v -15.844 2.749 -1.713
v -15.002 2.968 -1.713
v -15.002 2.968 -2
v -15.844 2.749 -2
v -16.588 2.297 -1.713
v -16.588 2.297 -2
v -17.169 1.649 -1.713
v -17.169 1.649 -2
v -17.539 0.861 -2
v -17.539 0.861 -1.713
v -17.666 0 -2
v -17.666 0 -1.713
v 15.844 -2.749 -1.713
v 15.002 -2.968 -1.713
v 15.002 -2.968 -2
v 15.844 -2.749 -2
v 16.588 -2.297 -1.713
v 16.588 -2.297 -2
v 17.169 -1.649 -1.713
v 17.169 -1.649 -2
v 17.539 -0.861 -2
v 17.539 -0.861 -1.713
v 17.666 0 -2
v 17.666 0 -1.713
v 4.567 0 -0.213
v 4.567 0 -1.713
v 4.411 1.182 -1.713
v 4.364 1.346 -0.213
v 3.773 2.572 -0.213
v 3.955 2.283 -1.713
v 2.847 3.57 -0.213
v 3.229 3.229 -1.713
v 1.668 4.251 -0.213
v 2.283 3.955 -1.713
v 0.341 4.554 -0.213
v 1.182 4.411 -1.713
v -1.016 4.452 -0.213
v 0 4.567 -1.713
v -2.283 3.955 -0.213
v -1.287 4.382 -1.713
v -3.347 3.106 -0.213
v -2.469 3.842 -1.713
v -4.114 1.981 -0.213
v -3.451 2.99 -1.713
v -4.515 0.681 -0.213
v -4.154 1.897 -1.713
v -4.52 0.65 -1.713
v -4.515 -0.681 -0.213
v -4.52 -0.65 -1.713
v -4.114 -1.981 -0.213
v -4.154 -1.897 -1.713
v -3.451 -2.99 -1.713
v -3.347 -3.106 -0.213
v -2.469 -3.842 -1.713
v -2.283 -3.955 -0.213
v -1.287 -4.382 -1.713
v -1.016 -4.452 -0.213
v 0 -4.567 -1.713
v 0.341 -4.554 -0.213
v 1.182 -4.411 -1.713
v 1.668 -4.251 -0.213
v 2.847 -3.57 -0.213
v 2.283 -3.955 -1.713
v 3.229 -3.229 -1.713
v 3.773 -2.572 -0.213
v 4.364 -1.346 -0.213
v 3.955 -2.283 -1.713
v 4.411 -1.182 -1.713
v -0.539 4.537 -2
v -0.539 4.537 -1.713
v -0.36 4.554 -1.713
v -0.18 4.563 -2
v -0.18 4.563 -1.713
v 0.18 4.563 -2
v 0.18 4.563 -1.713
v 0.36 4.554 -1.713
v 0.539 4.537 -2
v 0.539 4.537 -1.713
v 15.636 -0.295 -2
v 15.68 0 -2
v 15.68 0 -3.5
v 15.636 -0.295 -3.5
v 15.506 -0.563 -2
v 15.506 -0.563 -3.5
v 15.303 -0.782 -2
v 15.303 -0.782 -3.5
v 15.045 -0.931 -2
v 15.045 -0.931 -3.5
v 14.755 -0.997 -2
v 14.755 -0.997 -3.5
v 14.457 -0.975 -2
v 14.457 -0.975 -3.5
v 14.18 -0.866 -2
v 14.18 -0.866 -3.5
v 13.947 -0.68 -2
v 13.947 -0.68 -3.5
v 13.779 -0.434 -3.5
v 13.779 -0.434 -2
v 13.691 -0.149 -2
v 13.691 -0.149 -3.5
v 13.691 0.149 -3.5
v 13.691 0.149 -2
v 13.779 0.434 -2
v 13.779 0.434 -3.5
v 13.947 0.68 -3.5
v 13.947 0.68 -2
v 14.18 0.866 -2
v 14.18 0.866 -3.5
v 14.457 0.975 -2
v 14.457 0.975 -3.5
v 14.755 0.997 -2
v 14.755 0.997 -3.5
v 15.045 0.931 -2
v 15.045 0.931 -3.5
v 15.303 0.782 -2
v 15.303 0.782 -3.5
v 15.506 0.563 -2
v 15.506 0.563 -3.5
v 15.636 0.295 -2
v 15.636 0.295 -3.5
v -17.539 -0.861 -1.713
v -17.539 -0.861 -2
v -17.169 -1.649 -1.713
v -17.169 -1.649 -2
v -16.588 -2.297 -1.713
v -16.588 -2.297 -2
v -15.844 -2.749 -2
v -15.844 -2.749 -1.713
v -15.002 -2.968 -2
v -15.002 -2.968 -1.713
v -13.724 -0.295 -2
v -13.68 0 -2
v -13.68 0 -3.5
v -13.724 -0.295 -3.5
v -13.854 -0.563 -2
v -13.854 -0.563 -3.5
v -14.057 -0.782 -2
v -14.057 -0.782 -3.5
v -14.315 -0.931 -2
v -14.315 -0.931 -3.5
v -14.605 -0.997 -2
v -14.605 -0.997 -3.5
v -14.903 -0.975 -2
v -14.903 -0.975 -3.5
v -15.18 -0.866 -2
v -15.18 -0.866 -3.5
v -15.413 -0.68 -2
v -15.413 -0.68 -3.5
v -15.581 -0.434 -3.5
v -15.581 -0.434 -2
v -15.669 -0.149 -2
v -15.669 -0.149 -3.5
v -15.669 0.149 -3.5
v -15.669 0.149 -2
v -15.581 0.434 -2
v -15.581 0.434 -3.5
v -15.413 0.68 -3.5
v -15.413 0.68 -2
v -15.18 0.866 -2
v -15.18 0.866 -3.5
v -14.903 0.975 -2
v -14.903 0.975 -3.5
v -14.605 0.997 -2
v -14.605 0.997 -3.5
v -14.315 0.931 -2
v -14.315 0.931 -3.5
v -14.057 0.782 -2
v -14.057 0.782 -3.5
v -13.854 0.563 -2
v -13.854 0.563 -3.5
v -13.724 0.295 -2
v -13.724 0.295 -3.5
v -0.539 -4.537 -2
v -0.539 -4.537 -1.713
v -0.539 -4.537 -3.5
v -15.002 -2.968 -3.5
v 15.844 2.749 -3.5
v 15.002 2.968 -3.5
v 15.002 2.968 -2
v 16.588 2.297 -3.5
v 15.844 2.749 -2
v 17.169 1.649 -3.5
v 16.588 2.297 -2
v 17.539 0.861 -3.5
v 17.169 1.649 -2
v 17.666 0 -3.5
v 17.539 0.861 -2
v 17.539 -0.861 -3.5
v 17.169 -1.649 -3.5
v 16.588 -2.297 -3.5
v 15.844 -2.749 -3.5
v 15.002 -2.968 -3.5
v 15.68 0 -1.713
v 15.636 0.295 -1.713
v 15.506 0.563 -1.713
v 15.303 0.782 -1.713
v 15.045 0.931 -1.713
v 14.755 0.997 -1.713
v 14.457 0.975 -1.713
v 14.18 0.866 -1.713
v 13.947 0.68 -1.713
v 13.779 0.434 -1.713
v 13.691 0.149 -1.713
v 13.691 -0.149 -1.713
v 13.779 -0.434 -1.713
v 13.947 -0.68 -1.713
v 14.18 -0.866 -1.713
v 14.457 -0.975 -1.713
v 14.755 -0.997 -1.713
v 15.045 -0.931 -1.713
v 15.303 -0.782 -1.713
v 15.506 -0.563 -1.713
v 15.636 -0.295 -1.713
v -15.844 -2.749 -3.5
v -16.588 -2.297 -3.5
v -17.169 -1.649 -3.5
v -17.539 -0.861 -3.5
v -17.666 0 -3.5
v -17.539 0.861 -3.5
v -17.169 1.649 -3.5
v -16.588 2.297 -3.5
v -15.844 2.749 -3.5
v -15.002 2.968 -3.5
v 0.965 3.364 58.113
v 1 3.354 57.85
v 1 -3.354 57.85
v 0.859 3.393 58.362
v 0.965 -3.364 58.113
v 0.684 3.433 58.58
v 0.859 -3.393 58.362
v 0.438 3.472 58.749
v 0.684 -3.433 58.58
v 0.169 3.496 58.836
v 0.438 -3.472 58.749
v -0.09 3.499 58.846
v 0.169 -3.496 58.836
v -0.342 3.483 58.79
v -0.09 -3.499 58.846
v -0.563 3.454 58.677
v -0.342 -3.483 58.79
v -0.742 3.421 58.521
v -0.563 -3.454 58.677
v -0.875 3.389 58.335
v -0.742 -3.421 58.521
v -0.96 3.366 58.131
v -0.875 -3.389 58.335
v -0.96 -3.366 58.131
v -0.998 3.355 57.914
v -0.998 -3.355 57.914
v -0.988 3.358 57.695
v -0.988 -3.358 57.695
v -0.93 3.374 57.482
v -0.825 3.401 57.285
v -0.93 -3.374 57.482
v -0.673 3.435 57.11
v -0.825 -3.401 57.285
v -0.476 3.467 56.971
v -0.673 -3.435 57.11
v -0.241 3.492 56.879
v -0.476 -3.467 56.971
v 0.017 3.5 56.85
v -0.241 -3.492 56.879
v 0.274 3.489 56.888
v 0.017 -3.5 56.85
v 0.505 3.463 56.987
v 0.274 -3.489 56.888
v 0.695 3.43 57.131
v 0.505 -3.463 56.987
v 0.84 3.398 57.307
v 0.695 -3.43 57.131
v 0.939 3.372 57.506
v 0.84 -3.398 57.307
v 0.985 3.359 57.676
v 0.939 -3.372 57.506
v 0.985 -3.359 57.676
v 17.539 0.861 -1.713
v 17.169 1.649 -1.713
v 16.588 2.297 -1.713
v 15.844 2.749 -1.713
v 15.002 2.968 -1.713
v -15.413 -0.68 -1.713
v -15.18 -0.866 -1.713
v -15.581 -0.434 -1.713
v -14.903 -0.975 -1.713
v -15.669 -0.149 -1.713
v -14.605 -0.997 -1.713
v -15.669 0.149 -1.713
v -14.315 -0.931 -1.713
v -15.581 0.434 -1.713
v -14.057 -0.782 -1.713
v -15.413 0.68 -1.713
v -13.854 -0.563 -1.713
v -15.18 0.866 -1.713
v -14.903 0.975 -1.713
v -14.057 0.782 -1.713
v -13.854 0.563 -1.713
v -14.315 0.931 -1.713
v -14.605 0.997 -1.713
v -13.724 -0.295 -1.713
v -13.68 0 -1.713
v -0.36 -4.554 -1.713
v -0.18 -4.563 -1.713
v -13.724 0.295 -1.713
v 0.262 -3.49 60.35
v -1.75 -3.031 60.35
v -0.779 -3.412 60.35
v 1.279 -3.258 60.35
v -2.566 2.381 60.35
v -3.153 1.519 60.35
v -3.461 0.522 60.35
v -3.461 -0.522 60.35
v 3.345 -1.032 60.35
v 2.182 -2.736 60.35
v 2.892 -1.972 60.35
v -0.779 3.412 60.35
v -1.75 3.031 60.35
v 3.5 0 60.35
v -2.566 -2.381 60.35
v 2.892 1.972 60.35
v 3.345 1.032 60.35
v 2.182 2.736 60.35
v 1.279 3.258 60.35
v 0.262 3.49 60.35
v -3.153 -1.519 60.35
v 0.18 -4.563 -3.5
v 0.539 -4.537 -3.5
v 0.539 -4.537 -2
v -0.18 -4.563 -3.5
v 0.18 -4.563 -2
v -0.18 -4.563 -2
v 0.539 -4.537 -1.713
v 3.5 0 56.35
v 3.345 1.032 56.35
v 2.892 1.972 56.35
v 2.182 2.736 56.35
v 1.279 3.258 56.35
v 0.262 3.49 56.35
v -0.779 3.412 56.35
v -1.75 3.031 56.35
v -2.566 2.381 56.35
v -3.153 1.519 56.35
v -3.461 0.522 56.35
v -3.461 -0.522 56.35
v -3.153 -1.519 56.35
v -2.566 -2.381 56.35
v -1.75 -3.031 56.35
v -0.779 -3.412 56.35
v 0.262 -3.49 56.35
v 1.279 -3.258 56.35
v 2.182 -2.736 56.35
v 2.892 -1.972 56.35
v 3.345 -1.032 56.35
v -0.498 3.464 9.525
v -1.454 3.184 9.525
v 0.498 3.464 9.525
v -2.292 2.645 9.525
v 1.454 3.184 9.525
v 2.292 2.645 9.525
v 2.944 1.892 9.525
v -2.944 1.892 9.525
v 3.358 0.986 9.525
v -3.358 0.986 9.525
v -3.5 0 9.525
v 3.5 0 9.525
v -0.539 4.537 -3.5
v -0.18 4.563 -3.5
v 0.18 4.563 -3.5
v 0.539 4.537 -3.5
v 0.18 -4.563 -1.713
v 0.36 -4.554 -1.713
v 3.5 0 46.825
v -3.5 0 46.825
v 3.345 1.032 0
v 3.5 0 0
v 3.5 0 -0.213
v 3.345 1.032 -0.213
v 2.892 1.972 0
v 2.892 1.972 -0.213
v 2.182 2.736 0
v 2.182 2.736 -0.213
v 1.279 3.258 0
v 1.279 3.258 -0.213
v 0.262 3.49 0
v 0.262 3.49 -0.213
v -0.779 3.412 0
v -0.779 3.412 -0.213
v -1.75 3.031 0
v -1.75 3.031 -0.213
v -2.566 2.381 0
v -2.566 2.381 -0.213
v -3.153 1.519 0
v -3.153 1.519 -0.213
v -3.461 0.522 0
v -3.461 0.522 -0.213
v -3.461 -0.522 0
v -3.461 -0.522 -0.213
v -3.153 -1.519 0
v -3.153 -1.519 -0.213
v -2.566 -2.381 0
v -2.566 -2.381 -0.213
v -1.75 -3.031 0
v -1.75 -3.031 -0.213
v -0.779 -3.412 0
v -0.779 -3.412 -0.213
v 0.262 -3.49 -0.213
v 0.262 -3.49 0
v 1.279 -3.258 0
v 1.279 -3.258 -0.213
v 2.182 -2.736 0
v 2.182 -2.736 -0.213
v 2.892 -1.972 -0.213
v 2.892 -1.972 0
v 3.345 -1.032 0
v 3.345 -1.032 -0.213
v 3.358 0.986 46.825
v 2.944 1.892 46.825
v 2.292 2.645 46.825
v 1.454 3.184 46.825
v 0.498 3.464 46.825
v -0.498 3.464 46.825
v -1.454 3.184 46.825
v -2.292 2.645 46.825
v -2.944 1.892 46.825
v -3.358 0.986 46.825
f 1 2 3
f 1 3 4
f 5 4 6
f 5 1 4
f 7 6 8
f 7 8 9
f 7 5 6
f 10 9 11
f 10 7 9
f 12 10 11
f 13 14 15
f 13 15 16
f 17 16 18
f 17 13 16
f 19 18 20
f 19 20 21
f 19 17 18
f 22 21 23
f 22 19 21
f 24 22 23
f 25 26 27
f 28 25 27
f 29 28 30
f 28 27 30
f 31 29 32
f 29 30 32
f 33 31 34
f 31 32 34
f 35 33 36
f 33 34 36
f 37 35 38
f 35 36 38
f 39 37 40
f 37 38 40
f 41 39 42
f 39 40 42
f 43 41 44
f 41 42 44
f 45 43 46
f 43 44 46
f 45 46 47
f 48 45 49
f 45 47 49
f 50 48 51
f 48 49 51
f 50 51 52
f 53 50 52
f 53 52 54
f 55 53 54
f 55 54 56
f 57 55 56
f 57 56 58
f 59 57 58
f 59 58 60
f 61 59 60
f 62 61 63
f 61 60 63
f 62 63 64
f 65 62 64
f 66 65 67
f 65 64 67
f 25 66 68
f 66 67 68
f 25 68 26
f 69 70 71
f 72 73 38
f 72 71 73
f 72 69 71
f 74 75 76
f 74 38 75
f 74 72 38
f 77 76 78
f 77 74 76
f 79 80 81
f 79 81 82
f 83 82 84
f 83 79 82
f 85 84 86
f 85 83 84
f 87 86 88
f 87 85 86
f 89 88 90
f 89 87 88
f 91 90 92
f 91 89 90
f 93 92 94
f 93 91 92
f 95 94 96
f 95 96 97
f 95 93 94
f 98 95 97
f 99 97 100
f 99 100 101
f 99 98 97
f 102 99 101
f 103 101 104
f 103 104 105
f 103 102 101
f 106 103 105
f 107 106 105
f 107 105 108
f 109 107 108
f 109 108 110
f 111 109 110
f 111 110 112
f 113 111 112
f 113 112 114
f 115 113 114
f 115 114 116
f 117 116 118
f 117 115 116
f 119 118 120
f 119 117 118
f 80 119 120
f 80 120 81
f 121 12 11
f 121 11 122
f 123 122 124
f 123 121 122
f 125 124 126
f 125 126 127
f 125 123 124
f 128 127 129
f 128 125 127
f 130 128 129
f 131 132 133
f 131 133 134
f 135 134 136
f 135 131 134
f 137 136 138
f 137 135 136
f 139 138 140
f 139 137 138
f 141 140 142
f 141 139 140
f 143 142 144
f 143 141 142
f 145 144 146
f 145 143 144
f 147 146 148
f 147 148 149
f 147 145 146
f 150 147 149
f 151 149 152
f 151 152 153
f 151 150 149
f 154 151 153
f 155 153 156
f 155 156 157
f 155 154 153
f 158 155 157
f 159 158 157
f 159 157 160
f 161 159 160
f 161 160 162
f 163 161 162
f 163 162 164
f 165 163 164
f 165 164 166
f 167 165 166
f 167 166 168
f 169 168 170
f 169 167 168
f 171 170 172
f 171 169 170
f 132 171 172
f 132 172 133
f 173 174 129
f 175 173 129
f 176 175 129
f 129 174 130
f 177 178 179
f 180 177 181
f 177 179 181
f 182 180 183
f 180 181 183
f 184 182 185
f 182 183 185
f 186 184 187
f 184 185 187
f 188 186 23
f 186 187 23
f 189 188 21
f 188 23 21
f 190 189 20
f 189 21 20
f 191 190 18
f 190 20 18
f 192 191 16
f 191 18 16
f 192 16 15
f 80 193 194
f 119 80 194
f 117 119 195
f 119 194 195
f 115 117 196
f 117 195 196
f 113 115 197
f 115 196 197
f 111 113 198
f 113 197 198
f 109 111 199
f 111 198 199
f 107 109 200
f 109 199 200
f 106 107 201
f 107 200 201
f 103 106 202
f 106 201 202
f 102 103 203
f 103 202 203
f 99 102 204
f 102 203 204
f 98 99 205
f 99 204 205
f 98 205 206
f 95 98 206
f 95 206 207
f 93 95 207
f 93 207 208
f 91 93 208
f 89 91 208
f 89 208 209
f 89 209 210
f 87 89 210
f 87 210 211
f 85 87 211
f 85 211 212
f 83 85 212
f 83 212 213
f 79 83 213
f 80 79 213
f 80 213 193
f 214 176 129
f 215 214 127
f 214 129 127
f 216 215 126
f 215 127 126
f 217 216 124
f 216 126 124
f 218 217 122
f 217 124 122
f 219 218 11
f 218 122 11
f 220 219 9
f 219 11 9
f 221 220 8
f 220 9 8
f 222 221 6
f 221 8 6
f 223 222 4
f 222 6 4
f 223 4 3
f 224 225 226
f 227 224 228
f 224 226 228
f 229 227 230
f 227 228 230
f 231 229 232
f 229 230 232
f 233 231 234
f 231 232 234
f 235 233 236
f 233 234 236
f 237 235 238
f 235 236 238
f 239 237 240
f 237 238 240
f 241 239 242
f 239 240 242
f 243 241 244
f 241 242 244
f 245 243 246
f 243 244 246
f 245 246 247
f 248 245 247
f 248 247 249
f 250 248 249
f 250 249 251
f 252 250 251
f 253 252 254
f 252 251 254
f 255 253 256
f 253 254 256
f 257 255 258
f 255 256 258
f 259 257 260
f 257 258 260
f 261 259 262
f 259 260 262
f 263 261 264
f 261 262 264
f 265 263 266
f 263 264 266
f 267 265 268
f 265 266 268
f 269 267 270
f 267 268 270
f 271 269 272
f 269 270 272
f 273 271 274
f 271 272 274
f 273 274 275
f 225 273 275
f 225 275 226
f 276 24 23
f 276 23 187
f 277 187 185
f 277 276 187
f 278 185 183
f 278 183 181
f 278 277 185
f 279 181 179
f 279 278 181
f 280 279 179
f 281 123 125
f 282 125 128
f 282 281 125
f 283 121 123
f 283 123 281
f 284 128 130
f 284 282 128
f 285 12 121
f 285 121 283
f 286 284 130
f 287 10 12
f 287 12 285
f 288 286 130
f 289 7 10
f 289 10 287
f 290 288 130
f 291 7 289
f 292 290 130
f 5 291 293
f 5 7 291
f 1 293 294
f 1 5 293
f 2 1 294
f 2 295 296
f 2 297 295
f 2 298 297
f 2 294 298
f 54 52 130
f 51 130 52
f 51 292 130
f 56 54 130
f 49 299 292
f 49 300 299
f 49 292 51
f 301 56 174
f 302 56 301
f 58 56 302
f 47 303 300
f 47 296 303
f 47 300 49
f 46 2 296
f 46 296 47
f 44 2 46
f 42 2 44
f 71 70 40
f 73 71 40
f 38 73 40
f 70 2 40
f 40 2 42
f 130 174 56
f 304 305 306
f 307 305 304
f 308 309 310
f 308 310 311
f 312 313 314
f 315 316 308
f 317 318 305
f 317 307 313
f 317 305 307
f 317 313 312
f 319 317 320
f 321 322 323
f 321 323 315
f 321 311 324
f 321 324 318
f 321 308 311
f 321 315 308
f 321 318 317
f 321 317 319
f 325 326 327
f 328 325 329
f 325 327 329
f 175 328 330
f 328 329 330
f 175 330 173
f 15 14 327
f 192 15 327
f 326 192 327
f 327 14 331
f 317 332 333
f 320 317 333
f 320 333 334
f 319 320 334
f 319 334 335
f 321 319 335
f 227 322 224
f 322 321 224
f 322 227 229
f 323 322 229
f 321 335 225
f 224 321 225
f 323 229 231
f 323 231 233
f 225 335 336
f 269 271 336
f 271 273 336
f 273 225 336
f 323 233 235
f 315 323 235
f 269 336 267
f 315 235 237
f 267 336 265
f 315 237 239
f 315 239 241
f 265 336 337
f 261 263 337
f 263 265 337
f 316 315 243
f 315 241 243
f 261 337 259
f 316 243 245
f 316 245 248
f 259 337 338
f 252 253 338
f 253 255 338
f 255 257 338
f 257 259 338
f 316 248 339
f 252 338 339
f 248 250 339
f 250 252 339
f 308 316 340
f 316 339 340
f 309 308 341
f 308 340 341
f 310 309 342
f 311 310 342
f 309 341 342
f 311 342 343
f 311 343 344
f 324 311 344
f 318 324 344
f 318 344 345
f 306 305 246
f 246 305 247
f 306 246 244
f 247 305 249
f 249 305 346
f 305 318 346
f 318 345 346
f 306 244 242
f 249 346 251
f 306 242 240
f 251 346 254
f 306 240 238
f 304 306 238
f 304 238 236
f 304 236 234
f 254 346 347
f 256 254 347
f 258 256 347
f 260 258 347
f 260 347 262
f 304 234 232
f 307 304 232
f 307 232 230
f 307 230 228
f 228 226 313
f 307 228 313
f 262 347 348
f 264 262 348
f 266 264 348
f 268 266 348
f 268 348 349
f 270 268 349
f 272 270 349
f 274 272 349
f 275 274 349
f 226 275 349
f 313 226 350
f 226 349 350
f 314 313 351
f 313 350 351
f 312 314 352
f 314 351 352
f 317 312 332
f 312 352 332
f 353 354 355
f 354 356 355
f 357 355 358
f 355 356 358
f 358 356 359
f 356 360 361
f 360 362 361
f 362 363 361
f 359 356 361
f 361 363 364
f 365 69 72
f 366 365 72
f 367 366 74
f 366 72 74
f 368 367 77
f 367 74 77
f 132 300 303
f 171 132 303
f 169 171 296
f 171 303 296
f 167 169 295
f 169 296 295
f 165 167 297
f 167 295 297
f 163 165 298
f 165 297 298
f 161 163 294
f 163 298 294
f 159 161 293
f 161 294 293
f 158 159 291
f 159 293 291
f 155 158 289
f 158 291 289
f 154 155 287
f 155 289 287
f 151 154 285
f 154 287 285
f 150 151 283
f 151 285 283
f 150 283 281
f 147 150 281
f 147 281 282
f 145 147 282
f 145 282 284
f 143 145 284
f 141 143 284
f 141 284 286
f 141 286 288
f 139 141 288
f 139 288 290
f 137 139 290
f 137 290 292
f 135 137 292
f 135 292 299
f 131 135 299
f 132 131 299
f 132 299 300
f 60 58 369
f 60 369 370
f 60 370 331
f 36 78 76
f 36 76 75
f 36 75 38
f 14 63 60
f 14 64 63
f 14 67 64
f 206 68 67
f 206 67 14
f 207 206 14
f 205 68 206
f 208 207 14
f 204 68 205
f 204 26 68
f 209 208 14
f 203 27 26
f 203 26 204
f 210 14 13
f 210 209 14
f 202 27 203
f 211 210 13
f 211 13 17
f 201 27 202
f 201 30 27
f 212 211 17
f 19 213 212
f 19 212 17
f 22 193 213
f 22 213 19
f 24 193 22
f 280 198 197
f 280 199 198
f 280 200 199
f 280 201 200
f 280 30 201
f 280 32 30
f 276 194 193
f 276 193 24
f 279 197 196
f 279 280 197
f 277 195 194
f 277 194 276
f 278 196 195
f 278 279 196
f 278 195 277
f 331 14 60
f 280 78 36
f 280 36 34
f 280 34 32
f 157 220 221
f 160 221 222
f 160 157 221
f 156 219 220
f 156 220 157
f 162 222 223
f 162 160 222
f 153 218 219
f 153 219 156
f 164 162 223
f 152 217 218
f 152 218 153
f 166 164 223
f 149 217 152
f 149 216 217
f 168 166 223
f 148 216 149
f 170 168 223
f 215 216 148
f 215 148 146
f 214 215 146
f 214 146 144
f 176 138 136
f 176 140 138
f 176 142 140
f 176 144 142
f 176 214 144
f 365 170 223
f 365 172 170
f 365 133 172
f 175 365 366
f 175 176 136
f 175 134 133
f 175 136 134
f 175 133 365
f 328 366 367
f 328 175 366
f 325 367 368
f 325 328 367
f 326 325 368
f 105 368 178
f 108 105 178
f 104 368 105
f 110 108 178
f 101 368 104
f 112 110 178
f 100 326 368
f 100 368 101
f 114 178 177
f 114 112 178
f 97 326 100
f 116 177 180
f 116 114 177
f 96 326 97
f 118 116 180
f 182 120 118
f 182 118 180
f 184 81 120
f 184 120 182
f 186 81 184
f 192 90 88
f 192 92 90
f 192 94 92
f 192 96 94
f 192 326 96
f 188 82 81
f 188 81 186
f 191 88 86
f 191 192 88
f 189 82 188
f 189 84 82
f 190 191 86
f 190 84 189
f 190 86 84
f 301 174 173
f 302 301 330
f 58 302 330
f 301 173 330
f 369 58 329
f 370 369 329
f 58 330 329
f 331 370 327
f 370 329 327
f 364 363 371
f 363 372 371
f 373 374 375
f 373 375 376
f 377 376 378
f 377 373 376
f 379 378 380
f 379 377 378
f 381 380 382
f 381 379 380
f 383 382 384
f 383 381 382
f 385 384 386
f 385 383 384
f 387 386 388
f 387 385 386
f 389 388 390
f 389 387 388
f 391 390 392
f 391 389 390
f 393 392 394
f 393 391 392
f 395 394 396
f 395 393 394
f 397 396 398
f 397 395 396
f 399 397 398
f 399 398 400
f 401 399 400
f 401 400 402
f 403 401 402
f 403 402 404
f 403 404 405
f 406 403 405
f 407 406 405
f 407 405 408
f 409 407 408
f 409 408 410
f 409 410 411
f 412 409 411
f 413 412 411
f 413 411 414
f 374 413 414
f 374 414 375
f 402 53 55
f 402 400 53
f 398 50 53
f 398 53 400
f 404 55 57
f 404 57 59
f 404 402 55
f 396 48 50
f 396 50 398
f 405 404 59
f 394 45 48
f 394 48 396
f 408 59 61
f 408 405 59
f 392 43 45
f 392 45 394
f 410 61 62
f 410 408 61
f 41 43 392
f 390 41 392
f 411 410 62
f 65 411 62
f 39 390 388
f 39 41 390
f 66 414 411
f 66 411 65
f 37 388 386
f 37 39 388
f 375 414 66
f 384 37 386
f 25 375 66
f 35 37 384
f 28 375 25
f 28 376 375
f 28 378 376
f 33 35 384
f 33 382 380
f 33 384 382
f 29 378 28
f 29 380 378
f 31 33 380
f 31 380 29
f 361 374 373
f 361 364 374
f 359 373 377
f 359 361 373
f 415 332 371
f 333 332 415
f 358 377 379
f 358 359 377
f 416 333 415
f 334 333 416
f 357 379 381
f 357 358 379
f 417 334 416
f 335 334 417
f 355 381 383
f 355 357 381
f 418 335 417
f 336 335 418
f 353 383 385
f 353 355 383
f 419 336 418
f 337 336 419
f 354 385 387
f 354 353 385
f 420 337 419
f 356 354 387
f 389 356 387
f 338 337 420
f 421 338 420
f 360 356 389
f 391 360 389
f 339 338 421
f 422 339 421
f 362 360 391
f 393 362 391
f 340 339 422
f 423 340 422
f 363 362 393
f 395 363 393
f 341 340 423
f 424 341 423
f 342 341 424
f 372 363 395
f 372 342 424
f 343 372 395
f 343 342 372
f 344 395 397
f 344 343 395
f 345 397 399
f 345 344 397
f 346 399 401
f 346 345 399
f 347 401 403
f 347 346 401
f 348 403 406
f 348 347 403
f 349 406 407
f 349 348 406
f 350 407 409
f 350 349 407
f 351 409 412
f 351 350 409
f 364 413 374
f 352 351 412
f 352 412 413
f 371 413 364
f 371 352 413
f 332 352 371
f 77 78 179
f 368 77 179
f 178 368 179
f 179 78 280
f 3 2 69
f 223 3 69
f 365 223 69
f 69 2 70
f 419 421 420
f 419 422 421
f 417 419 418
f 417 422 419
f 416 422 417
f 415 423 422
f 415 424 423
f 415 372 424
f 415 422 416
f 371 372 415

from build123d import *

# Parameters (mm, degrees)
F0_R          = 3.5
F1_DEPTH      = 56.35
F1_DEPTH_BACK = 1.5
F2_R          = 1
F3_DEPTH      = 2
F4_R          = 5
F5_R          = 5
F6_W          = 9.889290079
F6_H          = 18.65
F7_DEPTH      = 12.13642
F8_DEPTH      = 4
F9_R          = 1
F10_DEPTH     = 12.5
F11_R         = 1
F12_DEPTH     = 1.5
F13_R         = 1
F13_R_2       = 3.5
F14_DEPTH     = 1.71268
F15_R         = 4.5665029088
F16_DEPTH     = 1.5


with BuildPart() as f1:
    # F0 (on Top) → F1 (new body, two sides)
    with BuildSketch(Plane.XY) as f1_sk:
        Circle(F0_R)
    extrude(amount=F1_DEPTH)
    extrude(f1_sk.sketch, amount=-F1_DEPTH_BACK)

    # F2 (on Top) → F3 (join)
    with BuildSketch(Plane.XY):
        with BuildLine():
            Line((0, 4.5958375558), (-15.0020163562, 2.9683932874))
            ThreePointArc((-15.0020163562, 2.9683932874), (-16.902221013, 1.994188309), (-17.6658086413, 0))
            ThreePointArc((-17.6658086413, 0), (-16.902221013, -1.994188309), (-15.0020163562, -2.9683932874))
            Line((-15.0020163562, -2.9683932874), (0, -4.5958375558))
            Line((0, -4.5958375558), (15.0020163562, -2.9683932874))
            ThreePointArc((15.0020163562, -2.9683932874), (16.902221013, -1.994188309), (17.6658086413, 0))
            ThreePointArc((17.6658086413, 0), (16.902221013, 1.994188309), (15.0020163562, 2.9683932874))
            Line((15.0020163562, 2.9683932874), (0, 4.5958375558))
        make_face()
        with Locations((-14.68, 0)):
            Circle(F2_R, mode=Mode.SUBTRACT)
        with Locations((14.68, 0)):
            Circle(F2_R, mode=Mode.SUBTRACT)
    extrude(amount=-F3_DEPTH)

    # F4
    f4_edges = [f1.edges().sort_by_distance(p)[0] for p in [
        (0, 4.595838, -1),
    ]]
    fillet(f4_edges, radius=F4_R)

    # F5
    f5_edges = [f1.edges().sort_by_distance(p)[0] for p in [
        (0, -4.595838, -1),
    ]]
    fillet(f5_edges, radius=F5_R)

    # F6 (on Front) → F7 (cut)
    with BuildSketch(Plane.XZ):
        with Locations((-0.3122284543, 18.85)):
            Rectangle(F6_W, F6_H)
        with Locations((-0.3122284543, 37.5)):
            Rectangle(F6_W, F6_H)
    extrude(amount=-F7_DEPTH, mode=Mode.SUBTRACT)

    # F8 (add): a face of the model
    f8_faces = [f1.faces().sort_by_distance(p)[0] for p in [
        (0, 0, 56.35),
    ]]
    extrude(f8_faces, amount=F8_DEPTH)

    # F9 (on Front) → F10 (cut, symmetric)
    with BuildSketch(Plane.XZ):
        with Locations((0, 57.85)):
            Circle(F9_R)
    extrude(amount=F10_DEPTH, both=True, mode=Mode.SUBTRACT)

    # F11 (on face) → F12 (join)
    with BuildSketch(Plane(origin=(0, 0, -2), x_dir=(1, 0, 0), z_dir=(0, 0, -1))):
        with BuildLine():
            Line((-0.539244799, 4.5373393622), (-15.0020163562, 2.9683932874))
            ThreePointArc((-15.0020163562, 2.9683932874), (-17.6658086413, 0), (-15.0020163562, -2.9683932874))
            Line((-15.0020163562, -2.9683932874), (-0.539244799, -4.5373393622))
            ThreePointArc((-0.539244799, -4.5373393622), (0, -4.5665029088), (0.539244799, -4.5373393622))
            Line((0.539244799, -4.5373393622), (15.0020163562, -2.9683932874))
            ThreePointArc((15.0020163562, -2.9683932874), (17.6658086413, 0), (15.0020163562, 2.9683932874))
            Line((15.0020163562, 2.9683932874), (0.539244799, 4.5373393622))
            ThreePointArc((0.539244799, 4.5373393622), (0, 4.5665029088), (-0.539244799, 4.5373393622))
        make_face()
        with Locations((-14.68, 0)):
            Circle(F11_R, mode=Mode.SUBTRACT)
        with Locations((14.68, 0)):
            Circle(F11_R, mode=Mode.SUBTRACT)
    extrude(amount=F12_DEPTH)

    # F13 (on face) → F14 (cut)
    with BuildSketch(Plane.XY):
        with BuildLine():
            Line((0.539244799, -4.5373393622), (15.0020163562, -2.9683932874))
            ThreePointArc((15.0020163562, -2.9683932874), (17.6658086413, 0), (15.0020163562, 2.9683932874))
            Line((15.0020163562, 2.9683932874), (0.539244799, 4.5373393622))
            ThreePointArc((0.539244799, 4.5373393622), (0, 4.5665029088), (-0.539244799, 4.5373393622))
            Line((-0.539244799, 4.5373393622), (-15.0020163562, 2.9683932874))
            ThreePointArc((-15.0020163562, 2.9683932874), (-17.6658086413, 0), (-15.0020163562, -2.9683932874))
            Line((-15.0020163562, -2.9683932874), (-0.539244799, -4.5373393622))
            ThreePointArc((-0.539244799, -4.5373393622), (0, -4.5665029088), (0.539244799, -4.5373393622))
        make_face()
        with Locations((-14.68, 0)):
            Circle(F13_R, mode=Mode.SUBTRACT)
        Circle(F13_R_2, mode=Mode.SUBTRACT)
        with Locations((14.68, 0)):
            Circle(F13_R, mode=Mode.SUBTRACT)
    extrude(amount=-F14_DEPTH, mode=Mode.SUBTRACT)

    # F15 (on face) → F16 (join)
    with BuildSketch(Plane.XY.offset(-1.71268)):
        Circle(F15_R)
    extrude(amount=F16_DEPTH)


solid = f1.part
